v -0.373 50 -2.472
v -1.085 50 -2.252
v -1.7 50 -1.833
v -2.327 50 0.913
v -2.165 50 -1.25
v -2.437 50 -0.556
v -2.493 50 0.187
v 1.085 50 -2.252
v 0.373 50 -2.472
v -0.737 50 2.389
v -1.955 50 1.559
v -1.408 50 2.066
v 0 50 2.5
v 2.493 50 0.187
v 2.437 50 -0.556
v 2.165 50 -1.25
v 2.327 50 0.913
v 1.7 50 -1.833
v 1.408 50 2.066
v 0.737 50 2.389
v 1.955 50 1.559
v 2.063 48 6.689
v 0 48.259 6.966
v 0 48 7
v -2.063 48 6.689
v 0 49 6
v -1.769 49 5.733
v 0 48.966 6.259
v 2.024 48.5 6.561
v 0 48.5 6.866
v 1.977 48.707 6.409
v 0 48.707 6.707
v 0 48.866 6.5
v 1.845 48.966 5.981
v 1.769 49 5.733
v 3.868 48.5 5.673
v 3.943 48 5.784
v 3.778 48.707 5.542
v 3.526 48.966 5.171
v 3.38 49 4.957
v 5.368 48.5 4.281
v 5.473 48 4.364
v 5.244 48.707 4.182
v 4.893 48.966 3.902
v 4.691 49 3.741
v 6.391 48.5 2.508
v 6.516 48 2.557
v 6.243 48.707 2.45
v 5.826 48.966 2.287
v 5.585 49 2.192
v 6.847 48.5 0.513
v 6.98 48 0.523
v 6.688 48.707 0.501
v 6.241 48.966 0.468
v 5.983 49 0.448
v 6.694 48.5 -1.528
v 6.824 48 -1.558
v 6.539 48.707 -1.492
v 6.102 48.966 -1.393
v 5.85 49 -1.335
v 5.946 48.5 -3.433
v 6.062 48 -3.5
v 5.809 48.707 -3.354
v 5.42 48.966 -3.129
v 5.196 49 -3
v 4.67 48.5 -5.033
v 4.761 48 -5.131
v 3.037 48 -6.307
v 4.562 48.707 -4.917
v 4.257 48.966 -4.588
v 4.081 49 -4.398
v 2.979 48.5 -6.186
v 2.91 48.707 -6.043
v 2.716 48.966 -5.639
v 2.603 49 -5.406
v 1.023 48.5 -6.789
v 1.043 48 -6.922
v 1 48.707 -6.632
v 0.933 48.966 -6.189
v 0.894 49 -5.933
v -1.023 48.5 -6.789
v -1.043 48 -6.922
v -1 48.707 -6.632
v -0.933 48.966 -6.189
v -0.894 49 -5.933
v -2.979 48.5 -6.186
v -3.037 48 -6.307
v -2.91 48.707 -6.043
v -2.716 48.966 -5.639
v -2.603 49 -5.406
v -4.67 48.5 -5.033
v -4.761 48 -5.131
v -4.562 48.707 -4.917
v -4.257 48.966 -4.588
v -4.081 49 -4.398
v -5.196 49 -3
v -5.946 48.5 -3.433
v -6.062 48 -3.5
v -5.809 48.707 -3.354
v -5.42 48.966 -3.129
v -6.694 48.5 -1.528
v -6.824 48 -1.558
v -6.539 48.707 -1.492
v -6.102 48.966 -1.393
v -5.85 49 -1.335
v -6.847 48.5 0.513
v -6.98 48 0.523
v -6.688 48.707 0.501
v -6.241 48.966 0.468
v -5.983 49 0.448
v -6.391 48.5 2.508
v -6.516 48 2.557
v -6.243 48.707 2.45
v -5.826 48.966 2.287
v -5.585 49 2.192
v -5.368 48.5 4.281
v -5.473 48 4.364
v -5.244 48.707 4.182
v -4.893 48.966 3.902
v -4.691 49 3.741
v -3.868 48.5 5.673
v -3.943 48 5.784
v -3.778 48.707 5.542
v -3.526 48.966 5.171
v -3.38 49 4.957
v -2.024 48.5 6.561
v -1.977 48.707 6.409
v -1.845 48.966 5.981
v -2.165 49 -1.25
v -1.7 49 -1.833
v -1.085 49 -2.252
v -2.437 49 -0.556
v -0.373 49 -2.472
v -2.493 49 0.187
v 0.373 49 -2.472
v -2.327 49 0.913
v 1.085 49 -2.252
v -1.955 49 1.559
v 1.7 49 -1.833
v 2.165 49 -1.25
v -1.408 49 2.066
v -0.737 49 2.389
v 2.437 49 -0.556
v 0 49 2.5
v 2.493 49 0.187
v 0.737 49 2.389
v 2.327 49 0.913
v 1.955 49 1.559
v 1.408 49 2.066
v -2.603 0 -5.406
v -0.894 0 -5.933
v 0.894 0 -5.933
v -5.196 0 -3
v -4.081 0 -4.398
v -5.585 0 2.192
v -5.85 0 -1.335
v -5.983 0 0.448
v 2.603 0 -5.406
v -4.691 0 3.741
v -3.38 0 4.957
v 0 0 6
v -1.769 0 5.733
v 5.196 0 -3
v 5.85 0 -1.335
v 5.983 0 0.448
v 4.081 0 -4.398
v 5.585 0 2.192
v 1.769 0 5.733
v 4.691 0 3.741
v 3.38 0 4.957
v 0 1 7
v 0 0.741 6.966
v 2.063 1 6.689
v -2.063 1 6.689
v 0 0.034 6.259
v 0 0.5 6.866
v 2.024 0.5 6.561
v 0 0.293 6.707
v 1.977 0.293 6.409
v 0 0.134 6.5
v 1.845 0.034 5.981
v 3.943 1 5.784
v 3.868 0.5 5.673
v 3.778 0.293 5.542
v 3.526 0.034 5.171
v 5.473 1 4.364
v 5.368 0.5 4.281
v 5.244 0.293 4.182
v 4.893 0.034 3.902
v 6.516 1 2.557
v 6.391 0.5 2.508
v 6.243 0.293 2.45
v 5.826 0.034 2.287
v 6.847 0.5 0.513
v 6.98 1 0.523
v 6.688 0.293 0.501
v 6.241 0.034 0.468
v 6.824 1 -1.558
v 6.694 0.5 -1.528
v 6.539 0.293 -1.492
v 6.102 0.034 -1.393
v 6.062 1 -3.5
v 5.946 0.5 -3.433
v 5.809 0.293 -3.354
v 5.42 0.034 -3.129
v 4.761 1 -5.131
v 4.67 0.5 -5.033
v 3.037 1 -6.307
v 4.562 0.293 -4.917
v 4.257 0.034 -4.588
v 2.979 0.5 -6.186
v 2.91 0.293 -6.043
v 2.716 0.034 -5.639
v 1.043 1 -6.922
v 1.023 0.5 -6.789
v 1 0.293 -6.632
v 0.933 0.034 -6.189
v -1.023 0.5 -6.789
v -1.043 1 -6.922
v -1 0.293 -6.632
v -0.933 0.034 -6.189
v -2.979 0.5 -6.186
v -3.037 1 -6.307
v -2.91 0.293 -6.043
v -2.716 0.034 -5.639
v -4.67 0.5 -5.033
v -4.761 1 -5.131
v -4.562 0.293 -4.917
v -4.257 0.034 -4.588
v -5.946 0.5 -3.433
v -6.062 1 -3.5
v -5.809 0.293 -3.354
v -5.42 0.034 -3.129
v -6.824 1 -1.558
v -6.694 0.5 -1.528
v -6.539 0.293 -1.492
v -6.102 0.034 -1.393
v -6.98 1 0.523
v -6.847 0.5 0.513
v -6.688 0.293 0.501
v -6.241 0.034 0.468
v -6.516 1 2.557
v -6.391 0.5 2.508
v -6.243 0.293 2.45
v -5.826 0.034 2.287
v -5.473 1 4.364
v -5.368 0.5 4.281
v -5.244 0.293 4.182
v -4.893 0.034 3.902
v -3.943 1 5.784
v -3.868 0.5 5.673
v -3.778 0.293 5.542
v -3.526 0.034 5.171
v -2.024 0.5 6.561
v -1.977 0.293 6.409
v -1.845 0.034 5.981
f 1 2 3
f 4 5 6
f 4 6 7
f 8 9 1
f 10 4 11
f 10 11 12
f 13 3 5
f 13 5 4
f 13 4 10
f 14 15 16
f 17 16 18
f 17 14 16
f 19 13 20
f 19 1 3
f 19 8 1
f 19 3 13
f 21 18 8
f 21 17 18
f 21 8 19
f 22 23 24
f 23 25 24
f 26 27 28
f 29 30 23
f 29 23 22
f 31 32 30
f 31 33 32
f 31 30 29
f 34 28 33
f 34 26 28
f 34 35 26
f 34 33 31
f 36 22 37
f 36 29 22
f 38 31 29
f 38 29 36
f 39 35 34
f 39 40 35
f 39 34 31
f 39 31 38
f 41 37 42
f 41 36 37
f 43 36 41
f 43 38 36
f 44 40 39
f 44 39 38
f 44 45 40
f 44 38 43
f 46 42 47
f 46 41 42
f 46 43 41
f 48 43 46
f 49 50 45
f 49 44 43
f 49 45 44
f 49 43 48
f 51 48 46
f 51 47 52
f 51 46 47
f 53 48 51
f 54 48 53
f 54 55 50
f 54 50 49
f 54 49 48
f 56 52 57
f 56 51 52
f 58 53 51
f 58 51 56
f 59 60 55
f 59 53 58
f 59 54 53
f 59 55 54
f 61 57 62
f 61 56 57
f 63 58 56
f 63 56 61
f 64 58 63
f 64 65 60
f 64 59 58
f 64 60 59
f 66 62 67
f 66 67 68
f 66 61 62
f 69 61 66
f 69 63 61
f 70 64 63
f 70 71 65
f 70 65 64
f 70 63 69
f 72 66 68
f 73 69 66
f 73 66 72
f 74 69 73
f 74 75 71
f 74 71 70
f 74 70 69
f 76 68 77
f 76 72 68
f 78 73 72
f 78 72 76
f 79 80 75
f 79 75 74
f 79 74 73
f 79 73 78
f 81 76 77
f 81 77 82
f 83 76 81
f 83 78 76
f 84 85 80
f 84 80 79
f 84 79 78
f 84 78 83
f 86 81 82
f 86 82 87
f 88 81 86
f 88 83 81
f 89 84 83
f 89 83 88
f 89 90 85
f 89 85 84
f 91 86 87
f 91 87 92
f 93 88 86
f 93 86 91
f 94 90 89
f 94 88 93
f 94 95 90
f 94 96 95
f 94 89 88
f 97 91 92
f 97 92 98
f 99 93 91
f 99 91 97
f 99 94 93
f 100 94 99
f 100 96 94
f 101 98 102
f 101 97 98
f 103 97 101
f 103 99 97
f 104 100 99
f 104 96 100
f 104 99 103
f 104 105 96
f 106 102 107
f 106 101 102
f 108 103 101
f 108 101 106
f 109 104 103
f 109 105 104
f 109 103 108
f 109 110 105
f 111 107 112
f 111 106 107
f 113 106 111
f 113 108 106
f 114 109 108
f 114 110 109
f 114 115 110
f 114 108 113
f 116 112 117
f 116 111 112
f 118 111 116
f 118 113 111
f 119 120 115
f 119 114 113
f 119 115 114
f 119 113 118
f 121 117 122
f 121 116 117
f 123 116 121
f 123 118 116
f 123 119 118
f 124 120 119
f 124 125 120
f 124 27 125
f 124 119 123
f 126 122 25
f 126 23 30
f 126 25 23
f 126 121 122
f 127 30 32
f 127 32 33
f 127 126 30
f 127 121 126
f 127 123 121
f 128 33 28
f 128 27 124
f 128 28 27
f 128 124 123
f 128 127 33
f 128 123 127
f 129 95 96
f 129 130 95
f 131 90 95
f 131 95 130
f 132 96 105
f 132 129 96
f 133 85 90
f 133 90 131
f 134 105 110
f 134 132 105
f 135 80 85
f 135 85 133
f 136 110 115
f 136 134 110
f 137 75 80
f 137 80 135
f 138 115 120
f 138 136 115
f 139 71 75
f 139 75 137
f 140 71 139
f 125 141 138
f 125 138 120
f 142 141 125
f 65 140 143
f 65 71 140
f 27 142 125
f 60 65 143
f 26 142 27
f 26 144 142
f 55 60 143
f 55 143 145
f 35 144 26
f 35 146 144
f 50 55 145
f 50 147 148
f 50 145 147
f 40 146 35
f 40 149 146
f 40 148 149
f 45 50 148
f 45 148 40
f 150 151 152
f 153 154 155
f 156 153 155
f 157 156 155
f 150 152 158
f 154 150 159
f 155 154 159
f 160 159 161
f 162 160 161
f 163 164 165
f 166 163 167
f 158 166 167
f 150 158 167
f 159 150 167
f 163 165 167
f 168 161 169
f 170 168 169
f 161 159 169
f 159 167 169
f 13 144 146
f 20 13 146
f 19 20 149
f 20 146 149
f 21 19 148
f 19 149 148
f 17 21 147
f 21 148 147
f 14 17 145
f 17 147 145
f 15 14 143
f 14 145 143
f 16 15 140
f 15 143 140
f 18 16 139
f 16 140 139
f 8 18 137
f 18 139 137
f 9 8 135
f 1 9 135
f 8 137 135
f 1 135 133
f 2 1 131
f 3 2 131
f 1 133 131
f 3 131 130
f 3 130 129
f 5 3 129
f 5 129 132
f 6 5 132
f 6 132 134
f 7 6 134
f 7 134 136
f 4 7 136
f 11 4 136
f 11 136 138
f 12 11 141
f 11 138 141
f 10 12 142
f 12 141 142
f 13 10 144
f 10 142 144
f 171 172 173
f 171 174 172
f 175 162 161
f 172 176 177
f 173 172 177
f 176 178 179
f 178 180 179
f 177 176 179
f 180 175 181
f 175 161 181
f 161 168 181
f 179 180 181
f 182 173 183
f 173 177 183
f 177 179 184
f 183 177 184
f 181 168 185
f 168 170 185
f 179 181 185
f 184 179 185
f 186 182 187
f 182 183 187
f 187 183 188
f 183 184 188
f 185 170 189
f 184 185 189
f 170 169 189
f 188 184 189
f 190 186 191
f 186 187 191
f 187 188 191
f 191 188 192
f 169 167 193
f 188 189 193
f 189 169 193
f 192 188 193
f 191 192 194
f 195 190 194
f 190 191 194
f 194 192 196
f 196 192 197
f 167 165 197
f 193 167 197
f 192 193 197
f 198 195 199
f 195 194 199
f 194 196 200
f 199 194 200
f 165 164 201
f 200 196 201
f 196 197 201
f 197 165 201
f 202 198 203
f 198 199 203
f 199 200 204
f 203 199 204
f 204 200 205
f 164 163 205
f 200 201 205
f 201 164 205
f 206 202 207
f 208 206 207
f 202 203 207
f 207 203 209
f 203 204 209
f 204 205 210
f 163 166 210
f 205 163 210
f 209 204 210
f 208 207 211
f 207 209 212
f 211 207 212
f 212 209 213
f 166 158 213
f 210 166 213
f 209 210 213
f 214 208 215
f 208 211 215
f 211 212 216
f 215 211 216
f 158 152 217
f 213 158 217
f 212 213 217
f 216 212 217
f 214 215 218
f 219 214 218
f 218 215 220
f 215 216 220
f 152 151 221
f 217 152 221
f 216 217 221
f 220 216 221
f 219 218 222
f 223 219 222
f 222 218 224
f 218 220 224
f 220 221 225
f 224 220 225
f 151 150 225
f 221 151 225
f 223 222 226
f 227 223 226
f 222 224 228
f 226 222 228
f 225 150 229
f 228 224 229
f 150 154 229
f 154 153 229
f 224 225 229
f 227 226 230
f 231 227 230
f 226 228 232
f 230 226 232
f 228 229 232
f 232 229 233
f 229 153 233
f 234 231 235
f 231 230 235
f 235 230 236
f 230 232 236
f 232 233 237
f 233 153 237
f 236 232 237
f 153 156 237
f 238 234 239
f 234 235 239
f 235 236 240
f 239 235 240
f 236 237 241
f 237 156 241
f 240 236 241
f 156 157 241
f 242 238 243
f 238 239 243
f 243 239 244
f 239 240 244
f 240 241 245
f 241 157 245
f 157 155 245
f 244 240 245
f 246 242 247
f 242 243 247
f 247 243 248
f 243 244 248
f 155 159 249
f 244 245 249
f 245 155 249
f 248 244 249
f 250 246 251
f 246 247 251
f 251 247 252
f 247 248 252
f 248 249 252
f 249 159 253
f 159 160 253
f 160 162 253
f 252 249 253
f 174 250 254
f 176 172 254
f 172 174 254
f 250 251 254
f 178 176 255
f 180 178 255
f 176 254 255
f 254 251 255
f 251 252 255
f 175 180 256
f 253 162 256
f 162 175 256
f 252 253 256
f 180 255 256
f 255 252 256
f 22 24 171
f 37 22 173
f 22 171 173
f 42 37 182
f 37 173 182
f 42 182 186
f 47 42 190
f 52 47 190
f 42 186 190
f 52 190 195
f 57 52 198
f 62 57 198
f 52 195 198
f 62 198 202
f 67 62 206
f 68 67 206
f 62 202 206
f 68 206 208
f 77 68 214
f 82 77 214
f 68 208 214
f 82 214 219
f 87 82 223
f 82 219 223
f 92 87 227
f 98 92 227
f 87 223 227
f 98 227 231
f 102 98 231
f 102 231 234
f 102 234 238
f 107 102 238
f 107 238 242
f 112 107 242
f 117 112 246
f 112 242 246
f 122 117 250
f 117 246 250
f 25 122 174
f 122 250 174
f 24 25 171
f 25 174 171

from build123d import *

# Parameters (mm, degrees)
SKETCH_1_R      = 7
EXTRUDE_1_DEPTH = 49
SKETCH_2_R      = 2.5
EXTRUDE_2_DEPTH = 1
FILLET_1_R      = 1


with BuildPart() as part:
    # 草图1 → 凸台-拉伸1 (new body)
    with BuildSketch(Plane(origin=(0, 0, 0), x_dir=(1, 0, 0), z_dir=(0, 1, 0))):
        with Locations(Location((0, 0, 0), (0, 0, 270))):
            Circle(SKETCH_1_R)
    extrude(amount=EXTRUDE_1_DEPTH)

    # 草图2 → 凸台-拉伸2 (add)
    with BuildSketch(Plane(origin=(0, 49, 0), x_dir=(1, 0, 0), z_dir=(0, 1, 0))):
        with Locations(Location((0, 0, 0), (0, 0, 270))):
            Circle(SKETCH_2_R)
    extrude(amount=EXTRUDE_2_DEPTH)

    # 圆角1
    fillet_1_edges = [part.edges().sort_by_distance(p)[0] for p in [
        (0, 0, -7),
        (0, 49, -7),
    ]]
    fillet(fillet_1_edges, radius=FILLET_1_R)


solid = part.part
